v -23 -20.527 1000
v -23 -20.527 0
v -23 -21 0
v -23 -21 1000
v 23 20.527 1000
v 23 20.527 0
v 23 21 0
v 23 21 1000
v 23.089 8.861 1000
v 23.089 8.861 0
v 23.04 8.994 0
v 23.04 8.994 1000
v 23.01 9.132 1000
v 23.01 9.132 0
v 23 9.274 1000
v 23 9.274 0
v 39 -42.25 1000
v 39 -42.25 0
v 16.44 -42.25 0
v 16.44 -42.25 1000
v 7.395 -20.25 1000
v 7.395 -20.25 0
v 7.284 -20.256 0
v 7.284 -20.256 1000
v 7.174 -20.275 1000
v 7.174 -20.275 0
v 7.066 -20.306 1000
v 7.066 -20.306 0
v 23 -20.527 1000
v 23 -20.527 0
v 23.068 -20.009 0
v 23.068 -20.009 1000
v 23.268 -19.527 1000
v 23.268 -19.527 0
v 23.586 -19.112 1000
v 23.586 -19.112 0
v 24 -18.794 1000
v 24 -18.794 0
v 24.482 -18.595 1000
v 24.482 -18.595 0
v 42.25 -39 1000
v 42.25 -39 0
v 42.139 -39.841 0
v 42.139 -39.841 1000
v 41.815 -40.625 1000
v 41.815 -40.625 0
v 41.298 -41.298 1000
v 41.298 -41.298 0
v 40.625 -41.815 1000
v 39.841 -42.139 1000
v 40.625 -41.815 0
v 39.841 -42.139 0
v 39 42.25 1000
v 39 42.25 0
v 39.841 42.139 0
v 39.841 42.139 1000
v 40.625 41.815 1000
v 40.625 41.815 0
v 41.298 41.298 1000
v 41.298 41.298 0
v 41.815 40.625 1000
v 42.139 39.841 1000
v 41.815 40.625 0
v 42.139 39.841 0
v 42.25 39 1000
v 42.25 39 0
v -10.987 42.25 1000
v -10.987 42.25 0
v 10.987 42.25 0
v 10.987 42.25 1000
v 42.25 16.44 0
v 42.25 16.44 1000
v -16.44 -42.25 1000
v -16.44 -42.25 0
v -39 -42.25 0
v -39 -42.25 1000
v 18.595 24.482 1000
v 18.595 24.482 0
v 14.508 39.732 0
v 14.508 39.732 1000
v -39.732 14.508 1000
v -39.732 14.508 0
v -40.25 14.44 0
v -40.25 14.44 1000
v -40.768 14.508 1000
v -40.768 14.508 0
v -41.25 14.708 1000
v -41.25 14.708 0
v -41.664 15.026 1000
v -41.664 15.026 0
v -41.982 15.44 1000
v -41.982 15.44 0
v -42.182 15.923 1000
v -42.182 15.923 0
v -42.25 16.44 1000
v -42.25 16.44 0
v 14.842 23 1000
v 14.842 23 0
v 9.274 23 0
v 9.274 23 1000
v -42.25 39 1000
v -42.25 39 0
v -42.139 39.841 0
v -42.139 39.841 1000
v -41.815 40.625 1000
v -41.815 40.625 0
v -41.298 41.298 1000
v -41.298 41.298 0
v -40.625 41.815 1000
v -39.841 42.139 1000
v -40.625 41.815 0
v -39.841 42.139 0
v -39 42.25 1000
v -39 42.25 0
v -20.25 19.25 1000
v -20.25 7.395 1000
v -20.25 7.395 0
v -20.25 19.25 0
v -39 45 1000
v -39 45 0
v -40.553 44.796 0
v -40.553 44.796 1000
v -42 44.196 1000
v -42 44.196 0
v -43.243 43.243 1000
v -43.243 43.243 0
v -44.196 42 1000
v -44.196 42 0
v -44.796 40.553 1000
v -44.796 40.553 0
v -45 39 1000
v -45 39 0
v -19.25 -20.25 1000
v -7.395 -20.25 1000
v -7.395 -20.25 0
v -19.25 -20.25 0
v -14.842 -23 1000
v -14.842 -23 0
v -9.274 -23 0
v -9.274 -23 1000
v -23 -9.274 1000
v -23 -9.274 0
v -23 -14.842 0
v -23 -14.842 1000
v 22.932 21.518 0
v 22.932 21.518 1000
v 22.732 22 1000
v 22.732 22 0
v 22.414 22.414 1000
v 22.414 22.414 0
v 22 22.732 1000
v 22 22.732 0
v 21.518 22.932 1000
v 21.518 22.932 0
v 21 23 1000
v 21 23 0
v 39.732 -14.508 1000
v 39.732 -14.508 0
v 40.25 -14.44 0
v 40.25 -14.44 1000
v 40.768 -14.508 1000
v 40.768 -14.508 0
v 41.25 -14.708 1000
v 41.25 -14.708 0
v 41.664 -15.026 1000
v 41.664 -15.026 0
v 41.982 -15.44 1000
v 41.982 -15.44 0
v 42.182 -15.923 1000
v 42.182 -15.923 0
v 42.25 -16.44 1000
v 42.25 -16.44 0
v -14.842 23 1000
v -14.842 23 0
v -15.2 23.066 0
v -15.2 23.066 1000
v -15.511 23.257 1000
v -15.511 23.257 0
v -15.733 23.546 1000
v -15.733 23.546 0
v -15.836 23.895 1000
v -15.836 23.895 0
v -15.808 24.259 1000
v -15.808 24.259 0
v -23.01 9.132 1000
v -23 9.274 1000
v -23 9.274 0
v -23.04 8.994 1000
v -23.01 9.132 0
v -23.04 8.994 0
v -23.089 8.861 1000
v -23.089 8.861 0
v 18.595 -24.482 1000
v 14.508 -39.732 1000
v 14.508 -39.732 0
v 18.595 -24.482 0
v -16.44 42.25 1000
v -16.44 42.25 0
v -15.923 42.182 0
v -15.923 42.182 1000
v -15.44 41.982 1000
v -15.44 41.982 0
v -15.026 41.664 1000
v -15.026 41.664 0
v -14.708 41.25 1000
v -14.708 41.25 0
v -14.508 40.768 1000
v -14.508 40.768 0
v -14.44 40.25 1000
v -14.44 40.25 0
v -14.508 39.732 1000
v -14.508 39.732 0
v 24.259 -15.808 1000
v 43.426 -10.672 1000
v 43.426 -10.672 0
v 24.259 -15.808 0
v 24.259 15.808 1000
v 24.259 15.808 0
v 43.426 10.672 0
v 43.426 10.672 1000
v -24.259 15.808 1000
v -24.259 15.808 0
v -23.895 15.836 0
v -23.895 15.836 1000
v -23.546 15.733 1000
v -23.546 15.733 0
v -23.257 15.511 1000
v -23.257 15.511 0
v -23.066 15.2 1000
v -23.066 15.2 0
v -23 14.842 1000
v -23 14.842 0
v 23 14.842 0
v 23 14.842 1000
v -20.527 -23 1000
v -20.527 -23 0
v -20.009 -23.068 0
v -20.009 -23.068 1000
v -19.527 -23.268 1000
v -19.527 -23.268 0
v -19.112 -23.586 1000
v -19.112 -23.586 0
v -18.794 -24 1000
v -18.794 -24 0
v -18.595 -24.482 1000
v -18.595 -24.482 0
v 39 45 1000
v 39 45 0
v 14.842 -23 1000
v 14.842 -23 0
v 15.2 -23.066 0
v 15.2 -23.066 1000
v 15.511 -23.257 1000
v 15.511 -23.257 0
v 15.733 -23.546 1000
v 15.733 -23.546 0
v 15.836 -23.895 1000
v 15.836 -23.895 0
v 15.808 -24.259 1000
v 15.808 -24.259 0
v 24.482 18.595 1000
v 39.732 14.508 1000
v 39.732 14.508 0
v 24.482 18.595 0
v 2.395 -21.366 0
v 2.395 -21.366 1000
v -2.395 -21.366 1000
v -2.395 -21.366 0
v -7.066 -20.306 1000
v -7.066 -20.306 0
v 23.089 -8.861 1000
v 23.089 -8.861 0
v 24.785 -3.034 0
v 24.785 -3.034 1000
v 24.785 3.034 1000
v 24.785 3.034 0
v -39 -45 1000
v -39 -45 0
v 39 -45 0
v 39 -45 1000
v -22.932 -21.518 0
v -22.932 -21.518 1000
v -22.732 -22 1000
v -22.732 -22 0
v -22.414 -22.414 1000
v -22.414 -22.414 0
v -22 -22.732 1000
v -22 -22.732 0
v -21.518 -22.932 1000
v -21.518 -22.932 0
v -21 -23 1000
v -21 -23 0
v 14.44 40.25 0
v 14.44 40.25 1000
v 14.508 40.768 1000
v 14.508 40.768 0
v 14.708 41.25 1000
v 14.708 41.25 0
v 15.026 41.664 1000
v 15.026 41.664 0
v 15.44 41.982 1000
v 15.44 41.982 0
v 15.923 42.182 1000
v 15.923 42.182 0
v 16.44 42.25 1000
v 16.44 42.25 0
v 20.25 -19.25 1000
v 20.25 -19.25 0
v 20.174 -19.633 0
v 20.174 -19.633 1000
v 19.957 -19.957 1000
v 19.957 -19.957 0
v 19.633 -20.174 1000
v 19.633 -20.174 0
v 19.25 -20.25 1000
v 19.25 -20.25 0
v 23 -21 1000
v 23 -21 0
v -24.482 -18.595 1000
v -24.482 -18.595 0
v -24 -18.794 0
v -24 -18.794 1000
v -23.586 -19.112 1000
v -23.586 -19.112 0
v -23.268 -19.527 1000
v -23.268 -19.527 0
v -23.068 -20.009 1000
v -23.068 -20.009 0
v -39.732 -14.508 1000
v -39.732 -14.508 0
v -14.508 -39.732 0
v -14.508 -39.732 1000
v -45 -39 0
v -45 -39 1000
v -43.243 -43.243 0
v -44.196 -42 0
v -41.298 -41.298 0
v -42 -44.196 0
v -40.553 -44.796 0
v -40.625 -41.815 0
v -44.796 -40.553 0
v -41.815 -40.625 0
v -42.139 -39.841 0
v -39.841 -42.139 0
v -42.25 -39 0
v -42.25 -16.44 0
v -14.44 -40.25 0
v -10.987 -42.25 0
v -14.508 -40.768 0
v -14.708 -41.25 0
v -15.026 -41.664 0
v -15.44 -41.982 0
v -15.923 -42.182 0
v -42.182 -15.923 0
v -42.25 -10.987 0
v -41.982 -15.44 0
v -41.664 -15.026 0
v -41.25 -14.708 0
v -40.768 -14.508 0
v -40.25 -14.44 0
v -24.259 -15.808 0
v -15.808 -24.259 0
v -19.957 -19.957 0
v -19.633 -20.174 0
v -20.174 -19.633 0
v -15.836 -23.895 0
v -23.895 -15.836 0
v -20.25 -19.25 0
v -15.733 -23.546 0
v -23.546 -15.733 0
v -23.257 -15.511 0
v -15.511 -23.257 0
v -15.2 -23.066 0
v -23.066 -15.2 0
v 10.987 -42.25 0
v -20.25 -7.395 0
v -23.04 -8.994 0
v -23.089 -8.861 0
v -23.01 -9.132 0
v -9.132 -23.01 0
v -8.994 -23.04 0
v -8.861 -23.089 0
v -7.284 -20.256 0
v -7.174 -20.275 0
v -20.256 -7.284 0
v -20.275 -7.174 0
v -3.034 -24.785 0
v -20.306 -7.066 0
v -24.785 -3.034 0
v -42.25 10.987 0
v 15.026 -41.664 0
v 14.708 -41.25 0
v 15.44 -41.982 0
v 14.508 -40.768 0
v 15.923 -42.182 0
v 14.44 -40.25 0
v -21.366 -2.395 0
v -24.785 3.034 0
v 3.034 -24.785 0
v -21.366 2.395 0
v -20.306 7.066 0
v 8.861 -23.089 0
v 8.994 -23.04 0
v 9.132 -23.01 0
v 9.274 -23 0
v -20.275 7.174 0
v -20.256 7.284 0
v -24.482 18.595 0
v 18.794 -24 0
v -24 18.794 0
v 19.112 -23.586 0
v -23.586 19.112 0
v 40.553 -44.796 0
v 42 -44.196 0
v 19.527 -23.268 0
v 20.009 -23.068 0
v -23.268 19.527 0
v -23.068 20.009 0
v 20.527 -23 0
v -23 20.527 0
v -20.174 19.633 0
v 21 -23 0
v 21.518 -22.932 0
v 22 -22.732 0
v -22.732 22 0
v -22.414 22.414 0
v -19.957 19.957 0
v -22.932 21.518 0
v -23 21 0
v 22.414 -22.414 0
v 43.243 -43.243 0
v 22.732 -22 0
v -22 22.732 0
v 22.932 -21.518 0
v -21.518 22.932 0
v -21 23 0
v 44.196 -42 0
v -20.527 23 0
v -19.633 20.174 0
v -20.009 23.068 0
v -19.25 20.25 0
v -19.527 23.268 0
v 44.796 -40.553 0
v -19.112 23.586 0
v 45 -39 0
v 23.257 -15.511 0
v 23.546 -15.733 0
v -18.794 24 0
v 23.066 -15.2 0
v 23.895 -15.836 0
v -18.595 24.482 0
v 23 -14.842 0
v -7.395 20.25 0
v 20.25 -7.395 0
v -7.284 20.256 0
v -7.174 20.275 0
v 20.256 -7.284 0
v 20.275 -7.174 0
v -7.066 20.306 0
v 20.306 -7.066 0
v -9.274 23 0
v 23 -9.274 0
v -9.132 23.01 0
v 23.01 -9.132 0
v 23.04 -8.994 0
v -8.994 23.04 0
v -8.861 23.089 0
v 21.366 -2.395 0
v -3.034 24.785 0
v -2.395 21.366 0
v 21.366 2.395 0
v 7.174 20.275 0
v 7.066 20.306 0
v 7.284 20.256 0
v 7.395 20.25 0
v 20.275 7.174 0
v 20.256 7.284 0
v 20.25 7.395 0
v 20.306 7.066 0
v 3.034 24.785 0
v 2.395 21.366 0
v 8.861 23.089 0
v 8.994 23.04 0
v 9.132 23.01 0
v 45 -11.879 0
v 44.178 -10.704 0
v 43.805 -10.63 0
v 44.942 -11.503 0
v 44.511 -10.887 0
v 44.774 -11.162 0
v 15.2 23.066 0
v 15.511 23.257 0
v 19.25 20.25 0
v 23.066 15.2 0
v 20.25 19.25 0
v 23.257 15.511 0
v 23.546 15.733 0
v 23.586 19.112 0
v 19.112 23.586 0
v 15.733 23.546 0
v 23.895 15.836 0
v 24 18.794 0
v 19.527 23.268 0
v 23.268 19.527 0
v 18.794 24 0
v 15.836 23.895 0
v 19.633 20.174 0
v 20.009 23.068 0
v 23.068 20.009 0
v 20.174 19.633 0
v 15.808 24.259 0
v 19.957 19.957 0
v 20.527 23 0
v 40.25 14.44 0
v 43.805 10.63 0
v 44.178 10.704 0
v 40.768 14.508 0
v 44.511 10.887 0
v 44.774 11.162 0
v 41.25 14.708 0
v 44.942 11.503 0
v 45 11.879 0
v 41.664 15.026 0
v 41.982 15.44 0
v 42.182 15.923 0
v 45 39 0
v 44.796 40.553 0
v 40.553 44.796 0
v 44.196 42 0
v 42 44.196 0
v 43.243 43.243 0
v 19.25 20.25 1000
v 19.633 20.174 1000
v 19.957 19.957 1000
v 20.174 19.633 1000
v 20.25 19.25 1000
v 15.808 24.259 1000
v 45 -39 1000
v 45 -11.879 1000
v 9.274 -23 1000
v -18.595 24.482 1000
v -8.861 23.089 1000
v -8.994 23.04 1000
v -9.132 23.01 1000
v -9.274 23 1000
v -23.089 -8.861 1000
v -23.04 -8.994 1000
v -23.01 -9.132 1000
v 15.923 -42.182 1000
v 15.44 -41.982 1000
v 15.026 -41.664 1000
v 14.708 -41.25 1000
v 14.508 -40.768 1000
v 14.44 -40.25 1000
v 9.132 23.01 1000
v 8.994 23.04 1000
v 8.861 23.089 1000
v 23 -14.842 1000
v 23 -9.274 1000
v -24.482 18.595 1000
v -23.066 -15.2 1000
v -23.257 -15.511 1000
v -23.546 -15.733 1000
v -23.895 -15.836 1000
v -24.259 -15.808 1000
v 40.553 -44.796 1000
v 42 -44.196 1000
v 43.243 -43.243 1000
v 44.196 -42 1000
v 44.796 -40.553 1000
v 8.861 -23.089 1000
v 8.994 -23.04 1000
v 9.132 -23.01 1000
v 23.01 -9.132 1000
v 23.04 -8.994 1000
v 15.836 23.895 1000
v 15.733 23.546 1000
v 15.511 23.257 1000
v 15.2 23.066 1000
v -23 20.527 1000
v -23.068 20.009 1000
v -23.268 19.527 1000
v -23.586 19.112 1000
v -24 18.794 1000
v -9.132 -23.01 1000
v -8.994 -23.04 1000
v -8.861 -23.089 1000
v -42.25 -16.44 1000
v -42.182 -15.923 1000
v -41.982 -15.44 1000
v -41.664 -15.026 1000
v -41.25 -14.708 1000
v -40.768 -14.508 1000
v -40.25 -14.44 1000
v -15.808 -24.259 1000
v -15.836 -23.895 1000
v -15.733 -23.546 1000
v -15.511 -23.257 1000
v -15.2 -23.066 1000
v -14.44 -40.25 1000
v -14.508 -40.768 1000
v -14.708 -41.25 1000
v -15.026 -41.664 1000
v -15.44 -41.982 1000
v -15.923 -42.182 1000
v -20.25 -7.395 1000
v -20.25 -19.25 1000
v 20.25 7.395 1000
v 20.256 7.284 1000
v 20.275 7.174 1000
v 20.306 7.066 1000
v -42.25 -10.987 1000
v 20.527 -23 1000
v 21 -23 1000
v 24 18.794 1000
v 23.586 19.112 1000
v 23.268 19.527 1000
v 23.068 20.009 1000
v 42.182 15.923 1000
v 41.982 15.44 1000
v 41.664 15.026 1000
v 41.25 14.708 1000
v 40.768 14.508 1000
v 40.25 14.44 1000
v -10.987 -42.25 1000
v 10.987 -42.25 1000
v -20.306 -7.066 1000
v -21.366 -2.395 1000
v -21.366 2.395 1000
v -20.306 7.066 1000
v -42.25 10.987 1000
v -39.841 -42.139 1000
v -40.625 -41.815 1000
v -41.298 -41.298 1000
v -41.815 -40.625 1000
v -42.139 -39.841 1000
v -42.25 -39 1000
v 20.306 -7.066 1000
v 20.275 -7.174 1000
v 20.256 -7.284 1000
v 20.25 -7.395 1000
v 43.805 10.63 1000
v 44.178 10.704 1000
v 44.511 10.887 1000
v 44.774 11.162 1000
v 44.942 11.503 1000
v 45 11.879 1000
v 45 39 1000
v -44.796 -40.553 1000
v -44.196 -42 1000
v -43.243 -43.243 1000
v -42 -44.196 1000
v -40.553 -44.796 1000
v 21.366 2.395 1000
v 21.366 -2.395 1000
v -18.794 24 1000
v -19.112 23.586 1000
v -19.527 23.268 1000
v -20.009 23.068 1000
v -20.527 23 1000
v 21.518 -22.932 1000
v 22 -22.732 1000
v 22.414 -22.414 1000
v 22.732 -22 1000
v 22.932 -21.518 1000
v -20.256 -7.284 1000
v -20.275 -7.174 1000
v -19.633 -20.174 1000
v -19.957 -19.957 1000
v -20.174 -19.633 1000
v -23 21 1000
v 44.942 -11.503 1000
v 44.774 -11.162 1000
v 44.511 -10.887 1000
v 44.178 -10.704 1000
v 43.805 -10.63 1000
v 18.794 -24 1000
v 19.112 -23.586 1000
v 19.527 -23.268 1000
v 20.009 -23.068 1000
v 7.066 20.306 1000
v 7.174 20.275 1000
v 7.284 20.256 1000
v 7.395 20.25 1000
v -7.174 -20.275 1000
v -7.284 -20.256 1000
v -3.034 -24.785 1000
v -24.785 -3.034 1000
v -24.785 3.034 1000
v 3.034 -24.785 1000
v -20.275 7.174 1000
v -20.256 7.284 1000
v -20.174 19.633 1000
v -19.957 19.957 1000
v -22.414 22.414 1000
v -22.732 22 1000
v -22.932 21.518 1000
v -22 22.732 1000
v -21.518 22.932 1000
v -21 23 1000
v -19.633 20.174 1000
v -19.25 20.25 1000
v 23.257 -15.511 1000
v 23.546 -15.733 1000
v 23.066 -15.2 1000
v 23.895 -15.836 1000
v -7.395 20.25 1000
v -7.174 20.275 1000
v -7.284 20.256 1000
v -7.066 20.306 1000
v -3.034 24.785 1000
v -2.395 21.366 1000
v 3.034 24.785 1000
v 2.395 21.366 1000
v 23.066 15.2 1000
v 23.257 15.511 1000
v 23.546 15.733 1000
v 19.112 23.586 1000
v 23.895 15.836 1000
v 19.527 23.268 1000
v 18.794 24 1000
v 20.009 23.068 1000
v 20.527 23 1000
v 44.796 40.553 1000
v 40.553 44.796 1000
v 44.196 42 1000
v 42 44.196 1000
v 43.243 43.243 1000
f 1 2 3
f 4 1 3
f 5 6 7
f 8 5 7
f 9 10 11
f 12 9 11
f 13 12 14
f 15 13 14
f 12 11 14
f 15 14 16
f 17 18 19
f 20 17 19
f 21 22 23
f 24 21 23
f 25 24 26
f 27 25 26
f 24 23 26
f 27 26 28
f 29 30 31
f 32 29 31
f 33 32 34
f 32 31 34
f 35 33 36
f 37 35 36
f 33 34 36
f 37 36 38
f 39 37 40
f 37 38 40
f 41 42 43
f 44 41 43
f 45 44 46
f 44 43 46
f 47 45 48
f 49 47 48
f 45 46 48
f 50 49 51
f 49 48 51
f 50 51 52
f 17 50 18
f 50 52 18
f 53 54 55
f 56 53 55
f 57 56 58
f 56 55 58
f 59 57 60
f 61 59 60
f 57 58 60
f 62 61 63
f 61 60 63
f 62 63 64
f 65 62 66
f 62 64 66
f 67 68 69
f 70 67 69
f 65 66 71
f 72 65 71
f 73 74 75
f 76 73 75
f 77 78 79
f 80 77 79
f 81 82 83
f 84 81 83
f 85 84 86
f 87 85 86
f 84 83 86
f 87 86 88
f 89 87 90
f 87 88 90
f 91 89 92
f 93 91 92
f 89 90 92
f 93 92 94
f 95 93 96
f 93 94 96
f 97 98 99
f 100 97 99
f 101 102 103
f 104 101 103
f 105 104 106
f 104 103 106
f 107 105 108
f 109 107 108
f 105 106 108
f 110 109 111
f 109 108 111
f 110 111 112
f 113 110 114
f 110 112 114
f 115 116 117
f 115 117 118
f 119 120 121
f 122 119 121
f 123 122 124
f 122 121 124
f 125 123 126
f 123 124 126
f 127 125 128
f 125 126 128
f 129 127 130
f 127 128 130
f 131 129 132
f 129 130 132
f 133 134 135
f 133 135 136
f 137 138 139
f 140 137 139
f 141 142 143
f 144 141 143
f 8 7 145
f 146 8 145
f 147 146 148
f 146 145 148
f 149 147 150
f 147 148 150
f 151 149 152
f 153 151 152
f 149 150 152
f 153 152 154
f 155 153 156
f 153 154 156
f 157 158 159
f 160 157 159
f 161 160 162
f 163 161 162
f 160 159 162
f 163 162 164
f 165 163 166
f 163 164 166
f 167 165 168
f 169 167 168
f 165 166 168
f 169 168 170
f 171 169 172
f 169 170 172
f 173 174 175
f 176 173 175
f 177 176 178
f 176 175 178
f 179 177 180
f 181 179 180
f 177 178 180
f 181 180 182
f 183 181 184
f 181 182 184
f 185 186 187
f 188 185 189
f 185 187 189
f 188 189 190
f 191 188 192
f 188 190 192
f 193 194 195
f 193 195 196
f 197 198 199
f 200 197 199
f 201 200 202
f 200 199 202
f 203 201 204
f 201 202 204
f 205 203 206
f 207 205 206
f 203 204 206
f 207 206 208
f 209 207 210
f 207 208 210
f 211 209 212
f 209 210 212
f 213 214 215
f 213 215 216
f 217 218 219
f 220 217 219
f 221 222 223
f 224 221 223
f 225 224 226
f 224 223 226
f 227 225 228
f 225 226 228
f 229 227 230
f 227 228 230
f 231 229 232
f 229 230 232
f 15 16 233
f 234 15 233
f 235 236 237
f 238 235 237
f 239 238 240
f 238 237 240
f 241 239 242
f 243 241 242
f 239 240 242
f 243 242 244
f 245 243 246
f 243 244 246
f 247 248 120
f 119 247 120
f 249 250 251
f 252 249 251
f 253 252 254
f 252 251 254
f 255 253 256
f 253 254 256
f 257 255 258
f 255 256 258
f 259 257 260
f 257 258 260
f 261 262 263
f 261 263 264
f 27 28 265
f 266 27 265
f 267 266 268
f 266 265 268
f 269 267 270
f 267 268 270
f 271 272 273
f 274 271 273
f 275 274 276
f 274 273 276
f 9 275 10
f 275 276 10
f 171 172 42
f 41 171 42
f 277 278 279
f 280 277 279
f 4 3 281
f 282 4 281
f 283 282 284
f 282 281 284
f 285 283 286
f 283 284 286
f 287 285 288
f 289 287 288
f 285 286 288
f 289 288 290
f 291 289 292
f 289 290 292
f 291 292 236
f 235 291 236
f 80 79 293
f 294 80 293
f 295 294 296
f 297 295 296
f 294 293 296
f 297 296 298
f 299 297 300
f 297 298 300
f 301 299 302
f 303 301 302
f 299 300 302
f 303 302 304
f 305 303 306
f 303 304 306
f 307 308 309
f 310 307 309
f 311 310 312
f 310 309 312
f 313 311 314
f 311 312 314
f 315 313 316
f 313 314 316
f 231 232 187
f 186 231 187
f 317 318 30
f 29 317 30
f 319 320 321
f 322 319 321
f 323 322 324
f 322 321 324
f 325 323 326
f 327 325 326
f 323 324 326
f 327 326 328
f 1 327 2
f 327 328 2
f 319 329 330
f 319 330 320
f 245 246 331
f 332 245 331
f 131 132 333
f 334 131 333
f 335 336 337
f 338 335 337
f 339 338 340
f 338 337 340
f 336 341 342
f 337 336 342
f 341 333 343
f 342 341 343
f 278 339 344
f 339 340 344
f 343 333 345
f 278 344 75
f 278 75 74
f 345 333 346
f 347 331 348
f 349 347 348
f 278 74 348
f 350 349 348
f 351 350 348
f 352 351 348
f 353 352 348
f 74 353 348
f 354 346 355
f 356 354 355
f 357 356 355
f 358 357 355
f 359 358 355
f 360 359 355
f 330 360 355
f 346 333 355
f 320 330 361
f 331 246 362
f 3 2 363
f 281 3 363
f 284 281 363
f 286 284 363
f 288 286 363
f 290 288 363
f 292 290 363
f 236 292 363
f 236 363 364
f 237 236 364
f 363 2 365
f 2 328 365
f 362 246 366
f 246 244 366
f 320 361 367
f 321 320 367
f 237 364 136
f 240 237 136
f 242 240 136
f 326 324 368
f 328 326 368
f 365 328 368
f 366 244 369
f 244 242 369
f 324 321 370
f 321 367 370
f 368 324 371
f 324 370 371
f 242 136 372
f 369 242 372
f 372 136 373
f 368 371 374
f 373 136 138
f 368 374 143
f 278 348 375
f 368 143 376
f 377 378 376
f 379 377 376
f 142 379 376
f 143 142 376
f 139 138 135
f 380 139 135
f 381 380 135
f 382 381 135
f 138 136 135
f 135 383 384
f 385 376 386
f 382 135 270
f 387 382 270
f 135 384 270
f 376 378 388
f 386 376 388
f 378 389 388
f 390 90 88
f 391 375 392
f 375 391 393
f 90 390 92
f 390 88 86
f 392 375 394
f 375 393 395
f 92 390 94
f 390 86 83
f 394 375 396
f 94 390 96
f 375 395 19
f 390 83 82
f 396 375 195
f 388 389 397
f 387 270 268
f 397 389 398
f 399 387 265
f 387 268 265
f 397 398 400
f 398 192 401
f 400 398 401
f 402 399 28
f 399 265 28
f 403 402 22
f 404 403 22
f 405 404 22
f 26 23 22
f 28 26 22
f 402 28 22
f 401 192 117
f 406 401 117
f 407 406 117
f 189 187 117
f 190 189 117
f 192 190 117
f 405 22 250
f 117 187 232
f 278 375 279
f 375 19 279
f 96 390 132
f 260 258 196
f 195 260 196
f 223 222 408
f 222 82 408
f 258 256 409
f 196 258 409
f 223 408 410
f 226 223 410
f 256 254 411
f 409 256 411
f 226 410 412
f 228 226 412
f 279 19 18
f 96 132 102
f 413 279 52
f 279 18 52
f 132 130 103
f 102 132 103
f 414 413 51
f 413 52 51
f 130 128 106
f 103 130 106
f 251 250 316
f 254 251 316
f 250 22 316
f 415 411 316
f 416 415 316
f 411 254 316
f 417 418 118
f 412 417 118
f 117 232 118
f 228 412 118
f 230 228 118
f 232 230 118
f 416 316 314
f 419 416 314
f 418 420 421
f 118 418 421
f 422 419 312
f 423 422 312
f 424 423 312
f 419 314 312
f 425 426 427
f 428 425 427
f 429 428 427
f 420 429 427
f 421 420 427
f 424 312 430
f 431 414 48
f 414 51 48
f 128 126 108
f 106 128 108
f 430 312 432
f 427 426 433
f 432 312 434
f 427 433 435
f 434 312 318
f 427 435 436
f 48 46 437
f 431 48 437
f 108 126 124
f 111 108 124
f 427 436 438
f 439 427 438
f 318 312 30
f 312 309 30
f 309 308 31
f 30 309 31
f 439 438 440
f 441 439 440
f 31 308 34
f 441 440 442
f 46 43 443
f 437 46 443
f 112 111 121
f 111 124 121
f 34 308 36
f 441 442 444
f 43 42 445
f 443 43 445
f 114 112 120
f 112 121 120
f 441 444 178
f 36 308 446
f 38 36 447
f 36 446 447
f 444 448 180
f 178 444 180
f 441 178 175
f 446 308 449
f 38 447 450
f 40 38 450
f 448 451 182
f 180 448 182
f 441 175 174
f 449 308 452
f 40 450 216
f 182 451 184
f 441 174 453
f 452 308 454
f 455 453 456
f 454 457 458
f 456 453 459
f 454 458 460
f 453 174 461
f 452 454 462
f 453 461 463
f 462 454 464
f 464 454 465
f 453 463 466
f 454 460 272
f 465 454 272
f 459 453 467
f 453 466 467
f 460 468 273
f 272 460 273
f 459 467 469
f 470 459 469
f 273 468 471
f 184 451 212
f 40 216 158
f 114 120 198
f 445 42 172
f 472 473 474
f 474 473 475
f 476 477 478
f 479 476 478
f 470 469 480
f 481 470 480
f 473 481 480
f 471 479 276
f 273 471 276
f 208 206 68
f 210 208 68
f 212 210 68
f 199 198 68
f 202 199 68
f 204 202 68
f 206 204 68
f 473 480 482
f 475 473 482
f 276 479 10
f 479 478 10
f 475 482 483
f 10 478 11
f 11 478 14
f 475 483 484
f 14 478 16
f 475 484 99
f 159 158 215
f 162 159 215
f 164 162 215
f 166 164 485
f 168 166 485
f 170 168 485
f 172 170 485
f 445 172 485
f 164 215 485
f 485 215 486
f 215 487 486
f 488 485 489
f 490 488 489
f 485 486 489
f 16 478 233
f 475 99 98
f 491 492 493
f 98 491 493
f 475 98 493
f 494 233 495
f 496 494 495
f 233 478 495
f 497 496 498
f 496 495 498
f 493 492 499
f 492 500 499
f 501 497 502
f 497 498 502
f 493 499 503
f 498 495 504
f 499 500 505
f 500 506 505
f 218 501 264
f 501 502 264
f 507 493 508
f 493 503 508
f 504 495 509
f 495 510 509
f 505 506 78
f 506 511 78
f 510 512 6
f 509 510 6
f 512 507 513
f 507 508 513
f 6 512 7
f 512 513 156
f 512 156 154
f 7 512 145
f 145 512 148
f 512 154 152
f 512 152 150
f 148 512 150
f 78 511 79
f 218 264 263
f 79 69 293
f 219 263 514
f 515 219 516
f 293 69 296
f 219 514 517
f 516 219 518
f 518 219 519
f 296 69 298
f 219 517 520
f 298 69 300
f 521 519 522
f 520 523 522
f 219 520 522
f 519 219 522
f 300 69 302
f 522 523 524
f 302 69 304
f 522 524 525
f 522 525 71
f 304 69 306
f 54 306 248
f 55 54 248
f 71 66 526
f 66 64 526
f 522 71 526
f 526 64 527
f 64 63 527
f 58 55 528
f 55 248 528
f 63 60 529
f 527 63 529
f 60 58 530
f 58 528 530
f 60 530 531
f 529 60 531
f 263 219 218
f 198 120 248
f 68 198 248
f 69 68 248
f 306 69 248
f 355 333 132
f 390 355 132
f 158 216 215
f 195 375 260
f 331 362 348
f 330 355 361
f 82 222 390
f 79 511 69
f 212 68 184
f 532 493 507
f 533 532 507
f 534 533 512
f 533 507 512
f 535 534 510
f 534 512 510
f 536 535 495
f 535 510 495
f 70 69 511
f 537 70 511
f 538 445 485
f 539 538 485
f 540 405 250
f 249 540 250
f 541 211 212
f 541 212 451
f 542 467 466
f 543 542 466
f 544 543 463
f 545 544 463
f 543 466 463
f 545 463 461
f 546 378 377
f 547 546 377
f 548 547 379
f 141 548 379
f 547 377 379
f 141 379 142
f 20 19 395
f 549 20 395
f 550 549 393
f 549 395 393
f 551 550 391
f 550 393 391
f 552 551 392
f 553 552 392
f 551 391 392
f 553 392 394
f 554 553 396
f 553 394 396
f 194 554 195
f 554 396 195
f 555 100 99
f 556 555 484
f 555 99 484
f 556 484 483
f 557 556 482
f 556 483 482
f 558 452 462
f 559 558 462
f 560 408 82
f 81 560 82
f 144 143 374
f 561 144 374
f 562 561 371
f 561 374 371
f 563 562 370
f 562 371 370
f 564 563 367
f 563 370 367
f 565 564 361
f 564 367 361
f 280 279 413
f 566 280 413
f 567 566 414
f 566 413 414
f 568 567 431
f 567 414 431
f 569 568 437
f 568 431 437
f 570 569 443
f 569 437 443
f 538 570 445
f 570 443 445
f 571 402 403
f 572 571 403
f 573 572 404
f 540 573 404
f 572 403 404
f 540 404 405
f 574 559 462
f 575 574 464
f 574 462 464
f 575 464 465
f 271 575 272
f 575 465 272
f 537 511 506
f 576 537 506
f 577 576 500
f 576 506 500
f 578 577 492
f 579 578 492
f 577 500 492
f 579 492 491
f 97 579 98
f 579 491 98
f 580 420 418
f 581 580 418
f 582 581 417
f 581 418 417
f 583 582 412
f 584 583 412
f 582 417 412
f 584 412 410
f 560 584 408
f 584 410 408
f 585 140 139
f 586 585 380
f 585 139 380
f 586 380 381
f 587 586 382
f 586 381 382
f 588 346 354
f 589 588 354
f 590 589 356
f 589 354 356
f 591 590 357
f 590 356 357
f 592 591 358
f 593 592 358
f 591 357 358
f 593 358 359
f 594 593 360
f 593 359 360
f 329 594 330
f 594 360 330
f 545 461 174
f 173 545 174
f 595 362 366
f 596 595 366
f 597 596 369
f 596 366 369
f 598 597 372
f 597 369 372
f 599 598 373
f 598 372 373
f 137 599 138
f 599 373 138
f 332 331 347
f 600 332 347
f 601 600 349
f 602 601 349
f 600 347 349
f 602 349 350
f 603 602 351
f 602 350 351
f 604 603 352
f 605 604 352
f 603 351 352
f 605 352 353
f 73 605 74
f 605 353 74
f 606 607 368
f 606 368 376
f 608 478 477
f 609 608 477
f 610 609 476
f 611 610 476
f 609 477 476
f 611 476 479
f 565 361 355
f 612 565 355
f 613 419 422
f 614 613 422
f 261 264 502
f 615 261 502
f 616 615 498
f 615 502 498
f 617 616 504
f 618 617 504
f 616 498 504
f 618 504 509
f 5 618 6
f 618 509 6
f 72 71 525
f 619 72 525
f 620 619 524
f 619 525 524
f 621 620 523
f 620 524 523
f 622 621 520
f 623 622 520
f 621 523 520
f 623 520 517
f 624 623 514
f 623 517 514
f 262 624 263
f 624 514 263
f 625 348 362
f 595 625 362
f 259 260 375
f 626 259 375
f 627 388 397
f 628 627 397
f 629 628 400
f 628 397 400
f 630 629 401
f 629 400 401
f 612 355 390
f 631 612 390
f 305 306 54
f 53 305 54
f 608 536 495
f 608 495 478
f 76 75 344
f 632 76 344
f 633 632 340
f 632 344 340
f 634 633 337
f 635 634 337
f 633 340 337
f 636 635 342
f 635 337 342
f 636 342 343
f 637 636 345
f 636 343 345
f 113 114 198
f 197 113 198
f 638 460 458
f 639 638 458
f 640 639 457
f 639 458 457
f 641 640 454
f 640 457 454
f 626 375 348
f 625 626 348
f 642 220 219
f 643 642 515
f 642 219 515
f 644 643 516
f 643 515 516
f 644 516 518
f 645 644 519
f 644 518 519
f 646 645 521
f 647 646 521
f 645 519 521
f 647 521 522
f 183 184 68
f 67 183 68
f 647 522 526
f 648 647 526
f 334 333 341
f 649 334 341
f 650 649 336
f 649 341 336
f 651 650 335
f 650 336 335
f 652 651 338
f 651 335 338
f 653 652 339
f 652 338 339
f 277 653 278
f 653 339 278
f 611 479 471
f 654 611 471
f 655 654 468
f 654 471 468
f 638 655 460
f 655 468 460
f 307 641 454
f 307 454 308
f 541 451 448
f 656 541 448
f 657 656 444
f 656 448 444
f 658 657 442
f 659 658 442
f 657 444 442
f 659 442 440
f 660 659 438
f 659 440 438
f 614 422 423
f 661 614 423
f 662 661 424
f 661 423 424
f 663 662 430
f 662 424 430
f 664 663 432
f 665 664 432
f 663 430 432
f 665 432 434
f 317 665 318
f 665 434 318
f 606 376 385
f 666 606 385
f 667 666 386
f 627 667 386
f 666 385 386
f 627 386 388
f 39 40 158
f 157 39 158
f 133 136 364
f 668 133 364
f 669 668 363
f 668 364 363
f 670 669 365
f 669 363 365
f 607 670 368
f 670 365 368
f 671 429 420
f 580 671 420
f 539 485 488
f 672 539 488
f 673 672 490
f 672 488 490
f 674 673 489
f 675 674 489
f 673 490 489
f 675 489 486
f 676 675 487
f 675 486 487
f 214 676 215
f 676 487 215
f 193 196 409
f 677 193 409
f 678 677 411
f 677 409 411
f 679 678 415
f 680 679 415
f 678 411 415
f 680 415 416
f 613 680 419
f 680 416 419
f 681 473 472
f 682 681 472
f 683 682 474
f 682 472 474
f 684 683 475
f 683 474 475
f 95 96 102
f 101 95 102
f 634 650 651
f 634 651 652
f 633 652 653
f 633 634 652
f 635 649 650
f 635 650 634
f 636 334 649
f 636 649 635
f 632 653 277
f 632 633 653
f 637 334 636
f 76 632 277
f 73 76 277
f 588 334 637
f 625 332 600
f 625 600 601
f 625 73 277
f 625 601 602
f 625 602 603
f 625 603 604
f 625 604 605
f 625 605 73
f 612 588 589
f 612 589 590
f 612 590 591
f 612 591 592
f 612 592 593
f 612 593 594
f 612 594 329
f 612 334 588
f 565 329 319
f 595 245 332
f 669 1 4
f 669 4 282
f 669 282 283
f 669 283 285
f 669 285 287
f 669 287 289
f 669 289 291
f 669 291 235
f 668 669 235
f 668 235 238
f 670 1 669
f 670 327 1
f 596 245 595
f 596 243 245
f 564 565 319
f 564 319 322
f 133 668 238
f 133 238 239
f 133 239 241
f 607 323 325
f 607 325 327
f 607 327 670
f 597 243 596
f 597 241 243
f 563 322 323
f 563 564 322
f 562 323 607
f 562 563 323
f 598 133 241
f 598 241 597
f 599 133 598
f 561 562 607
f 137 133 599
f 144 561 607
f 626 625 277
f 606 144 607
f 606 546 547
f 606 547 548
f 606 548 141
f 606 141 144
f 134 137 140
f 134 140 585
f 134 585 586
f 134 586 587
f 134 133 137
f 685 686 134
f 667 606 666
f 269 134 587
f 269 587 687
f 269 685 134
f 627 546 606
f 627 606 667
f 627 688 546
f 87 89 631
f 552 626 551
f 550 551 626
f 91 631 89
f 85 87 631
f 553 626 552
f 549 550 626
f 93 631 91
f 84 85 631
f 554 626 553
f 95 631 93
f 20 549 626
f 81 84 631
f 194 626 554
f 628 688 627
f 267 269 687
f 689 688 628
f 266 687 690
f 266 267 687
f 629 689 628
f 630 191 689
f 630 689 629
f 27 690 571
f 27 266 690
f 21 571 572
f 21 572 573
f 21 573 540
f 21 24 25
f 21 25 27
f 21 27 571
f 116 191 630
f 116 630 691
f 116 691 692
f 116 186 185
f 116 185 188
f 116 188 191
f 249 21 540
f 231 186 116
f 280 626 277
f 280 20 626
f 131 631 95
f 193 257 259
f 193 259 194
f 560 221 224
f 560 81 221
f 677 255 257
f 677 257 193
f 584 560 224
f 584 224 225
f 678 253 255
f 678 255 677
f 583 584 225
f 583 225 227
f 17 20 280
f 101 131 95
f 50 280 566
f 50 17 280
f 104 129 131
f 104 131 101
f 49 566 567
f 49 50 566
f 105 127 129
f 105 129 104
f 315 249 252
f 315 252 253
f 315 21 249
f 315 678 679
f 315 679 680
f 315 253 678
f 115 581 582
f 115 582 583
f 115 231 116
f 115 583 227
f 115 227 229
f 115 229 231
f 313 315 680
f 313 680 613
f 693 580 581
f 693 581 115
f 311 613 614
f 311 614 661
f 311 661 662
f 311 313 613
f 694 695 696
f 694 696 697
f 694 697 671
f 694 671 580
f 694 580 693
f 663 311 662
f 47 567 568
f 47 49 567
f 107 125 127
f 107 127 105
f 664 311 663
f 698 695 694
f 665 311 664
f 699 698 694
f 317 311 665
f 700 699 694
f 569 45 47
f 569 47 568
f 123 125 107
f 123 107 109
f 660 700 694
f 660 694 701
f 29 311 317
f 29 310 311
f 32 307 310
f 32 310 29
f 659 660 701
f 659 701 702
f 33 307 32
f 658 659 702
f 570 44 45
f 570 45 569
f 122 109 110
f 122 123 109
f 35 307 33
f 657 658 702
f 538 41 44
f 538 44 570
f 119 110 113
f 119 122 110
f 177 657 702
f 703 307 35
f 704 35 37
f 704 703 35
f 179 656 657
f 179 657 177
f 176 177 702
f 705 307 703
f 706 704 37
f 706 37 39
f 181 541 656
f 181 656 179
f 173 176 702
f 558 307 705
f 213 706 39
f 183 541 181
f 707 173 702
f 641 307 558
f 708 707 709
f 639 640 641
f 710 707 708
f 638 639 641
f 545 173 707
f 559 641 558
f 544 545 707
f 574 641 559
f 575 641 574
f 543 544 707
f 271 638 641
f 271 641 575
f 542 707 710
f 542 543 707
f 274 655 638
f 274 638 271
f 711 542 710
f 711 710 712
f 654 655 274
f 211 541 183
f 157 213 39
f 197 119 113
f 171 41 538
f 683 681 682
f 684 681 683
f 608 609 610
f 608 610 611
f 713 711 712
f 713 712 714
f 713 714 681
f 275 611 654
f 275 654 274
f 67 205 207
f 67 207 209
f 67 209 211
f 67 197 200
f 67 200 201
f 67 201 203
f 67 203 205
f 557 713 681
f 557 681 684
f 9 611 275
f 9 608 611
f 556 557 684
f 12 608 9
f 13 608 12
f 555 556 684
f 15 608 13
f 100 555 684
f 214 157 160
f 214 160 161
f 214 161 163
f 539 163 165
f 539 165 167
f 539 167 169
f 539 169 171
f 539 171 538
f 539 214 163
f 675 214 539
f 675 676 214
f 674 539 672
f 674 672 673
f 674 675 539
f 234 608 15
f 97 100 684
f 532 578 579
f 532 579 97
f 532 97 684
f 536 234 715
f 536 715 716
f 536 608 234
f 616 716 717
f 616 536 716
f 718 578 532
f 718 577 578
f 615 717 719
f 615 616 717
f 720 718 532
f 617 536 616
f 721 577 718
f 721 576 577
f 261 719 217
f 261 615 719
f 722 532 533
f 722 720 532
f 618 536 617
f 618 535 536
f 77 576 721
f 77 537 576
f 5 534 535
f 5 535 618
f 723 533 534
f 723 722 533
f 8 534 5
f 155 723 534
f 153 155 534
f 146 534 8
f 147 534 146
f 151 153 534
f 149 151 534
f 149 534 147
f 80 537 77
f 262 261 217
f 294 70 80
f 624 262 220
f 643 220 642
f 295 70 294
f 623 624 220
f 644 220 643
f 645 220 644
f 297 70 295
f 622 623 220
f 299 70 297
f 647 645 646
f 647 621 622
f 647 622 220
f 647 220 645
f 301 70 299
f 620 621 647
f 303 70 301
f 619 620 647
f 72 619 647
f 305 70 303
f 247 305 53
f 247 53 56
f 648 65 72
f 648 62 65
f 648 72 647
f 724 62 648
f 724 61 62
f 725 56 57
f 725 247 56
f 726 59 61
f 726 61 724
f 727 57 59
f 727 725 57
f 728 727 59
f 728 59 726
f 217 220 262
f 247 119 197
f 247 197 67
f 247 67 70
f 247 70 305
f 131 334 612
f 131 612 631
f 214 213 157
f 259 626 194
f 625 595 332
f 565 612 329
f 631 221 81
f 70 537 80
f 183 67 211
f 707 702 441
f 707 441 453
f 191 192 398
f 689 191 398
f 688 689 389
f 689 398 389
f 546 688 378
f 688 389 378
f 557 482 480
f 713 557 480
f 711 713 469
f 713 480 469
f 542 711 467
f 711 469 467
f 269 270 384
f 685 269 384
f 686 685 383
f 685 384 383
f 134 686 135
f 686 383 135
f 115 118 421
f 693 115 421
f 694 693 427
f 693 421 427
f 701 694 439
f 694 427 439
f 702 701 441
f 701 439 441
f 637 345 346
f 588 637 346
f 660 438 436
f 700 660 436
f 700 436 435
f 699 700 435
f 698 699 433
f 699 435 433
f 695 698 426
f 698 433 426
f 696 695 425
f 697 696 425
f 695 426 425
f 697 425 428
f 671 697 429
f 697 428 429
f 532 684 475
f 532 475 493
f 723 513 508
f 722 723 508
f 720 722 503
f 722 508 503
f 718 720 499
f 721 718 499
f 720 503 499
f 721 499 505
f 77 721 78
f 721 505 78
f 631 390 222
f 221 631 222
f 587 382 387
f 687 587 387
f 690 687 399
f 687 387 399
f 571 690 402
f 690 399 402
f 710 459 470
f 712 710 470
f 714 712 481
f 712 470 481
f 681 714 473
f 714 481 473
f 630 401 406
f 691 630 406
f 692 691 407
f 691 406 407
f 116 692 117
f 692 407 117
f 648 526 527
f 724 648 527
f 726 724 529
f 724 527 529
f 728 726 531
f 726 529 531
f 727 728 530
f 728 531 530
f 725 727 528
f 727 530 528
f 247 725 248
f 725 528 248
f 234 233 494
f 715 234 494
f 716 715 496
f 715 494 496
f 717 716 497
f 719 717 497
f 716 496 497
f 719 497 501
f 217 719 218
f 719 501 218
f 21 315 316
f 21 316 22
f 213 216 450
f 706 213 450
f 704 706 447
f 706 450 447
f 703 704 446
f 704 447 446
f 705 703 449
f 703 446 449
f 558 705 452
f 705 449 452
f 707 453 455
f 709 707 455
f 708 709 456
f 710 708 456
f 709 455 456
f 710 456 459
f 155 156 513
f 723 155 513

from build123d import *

# Parameters (mm, degrees)
F1_DEPTH = 1000


# Not quite as in the source:
# - ends of sketch curves that miss each other by under 0.0002 mm in the source are joined


with BuildPart() as f1:
    # F0 (on Top) → F1 (new body)
    with BuildSketch(Plane.XY):
        with BuildLine():
            Line((23, 9.273618), (23, 14.841657))
            ThreePointArc((23, 14.841657), (23.3912385359, 15.6350103133), (24.2588189596, 15.8075828492))
            Line((24.2588189596, 15.8075828492), (43.426476, 10.671624))
            ThreePointArc((43.426476, 10.671624), (44.5109517857, 10.8873403242), (45, 11.879032))
            Line((45, 11.879032), (45, 39))
            ThreePointArc((45, 39), (43.2426406871, 43.2426406871), (39, 45))
            Line((39, 45), (-39, 45))
            ThreePointArc((-39, 45), (-43.2426406871, 43.2426406871), (-45, 39))
            Line((-45, 39), (-45, -39))
            ThreePointArc((-45, -39), (-43.2426406871, -43.2426406871), (-39, -45))
            Line((-39, -45), (39, -45))
            ThreePointArc((39, -45), (43.2426406871, -43.2426406871), (45, -39))
            Line((45, -39), (45, -11.879032))
            ThreePointArc((45, -11.879032), (44.5109517857, -10.8873403242), (43.4264761923, -10.6716247175))
            Line((43.4264761923, -10.6716247175), (24.258819, -15.807583))
            ThreePointArc((24.258819, -15.807583), (23.3912385359, -15.6350103133), (23, -14.841657))
            Line((23, -14.841657), (23, -9.273618))
            ThreePointArc((23, -9.273618), (23.022474706, -9.062799833), (23.0888885991, -8.8614578186))
            ThreePointArc((23.0888885991, -8.8614578186), (25, 0), (23.0888887851, 8.8614579028))
            ThreePointArc((23.0888887851, 8.8614579028), (23.022474706, 9.062799833), (23, 9.273618))
        make_face()
        with BuildLine():
            Line((15.807583, -24.258819), (10.98686, -42.25))
            Line((10.98686, -42.25), (-10.98686, -42.25))
            Line((-10.98686, -42.25), (-15.807583, -24.258819))
            ThreePointArc((-15.807583, -24.258819), (-15.6350103133, -23.3912385359), (-14.841657, -23))
            Line((-14.841657, -23), (-9.273618, -23))
            ThreePointArc((-9.273618, -23), (-9.062799833, -23.022474706), (-8.8614578186, -23.0888885991))
            ThreePointArc((-8.8614578186, -23.0888885991), (0, -25), (8.8614579028, -23.0888887851))
            ThreePointArc((8.8614579028, -23.0888887851), (9.062799833, -23.022474706), (9.273618, -23))
            Line((9.273618, -23), (14.841657, -23))
            ThreePointArc((14.841657, -23), (15.6350103133, -23.3912385359), (15.807583, -24.258819))
        make_face(mode=Mode.SUBTRACT)
        with BuildLine():
            ThreePointArc((-42.25, -16.440321), (-41.4675229282, -14.8536143733), (-39.7323620808, -14.5084693016))
            Line((-39.7323620808, -14.5084693016), (-24.482362, -18.594694))
            ThreePointArc((-24.482362, -18.594694), (-23.4132933733, -19.3090230718), (-23, -20.526546))
            Line((-23, -20.526546), (-23, -21))
            ThreePointArc((-23, -21), (-22.4142135624, -22.4142135624), (-21, -23))
            Line((-21, -23), (-20.526546, -23))
            ThreePointArc((-20.526546, -23), (-19.3090230718, -23.4132933733), (-18.5946943016, -24.4823620808))
            Line((-18.5946943016, -24.4823620808), (-14.508469, -39.732362))
            ThreePointArc((-14.508469, -39.732362), (-14.8536143733, -41.4675229282), (-16.440321, -42.25))
            Line((-16.440321, -42.25), (-39, -42.25))
            ThreePointArc((-39, -42.25), (-41.2980970389, -41.2980970389), (-42.25, -39))
            Line((-42.25, -39), (-42.25, -16.440321))
        make_face(mode=Mode.SUBTRACT)
        with BuildLine():
            ThreePointArc((16.440321, -42.25), (14.8536143733, -41.4675229282), (14.5084693016, -39.7323620808))
            Line((14.5084693016, -39.7323620808), (18.594694, -24.482362))
            ThreePointArc((18.594694, -24.482362), (19.3090230718, -23.4132933733), (20.526546, -23))
            Line((20.526546, -23), (21, -23))
            ThreePointArc((21, -23), (22.4142135624, -22.4142135624), (23, -21))
            Line((23, -21), (23, -20.526546))
            ThreePointArc((23, -20.526546), (23.4132933733, -19.3090230718), (24.4823620808, -18.5946943016))
            Line((24.4823620808, -18.5946943016), (39.732362, -14.508469))
            ThreePointArc((39.732362, -14.508469), (41.4675229282, -14.8536143733), (42.25, -16.440321))
            Line((42.25, -16.440321), (42.25, -39))
            ThreePointArc((42.25, -39), (41.2980970389, -41.2980970389), (39, -42.25))
            Line((39, -42.25), (16.440321, -42.25))
        make_face(mode=Mode.SUBTRACT)
        with BuildLine():
            Line((-24.258819, -15.807583), (-42.25, -10.98686))
            Line((-42.25, -10.98686), (-42.25, 10.98686))
            Line((-42.25, 10.98686), (-24.258819, 15.807583))
            ThreePointArc((-24.258819, 15.807583), (-23.3912385359, 15.6350103133), (-23, 14.841657))
            Line((-23, 14.841657), (-23, 9.273618))
            ThreePointArc((-23, 9.273618), (-23.022474706, 9.062799833), (-23.0888885991, 8.8614578186))
            ThreePointArc((-23.0888885991, 8.8614578186), (-25, 0), (-23.0888887851, -8.8614579028))
            ThreePointArc((-23.0888887851, -8.8614579028), (-23.022474706, -9.062799833), (-23, -9.273618))
            Line((-23, -9.273618), (-23, -14.841657))
            ThreePointArc((-23, -14.841657), (-23.3912385359, -15.6350103133), (-24.258819, -15.807583))
        make_face(mode=Mode.SUBTRACT)
        with BuildLine():
            ThreePointArc((19.25, 20.25), (19.9571067812, 19.9571067812), (20.25, 19.25))
            Line((20.25, 19.25), (20.25, 7.3951))
            ThreePointArc((20.25, 7.3951), (20.2639867072, 7.2284333074), (20.3055555728, 7.0664288513))
            ThreePointArc((20.3055554887, 7.066428822), (21.5, 0), (20.3055554887, -7.066428822))
            ThreePointArc((20.3055555728, -7.0664288513), (20.2639867072, -7.2284333074), (20.25, -7.3951))
            Line((20.25, -7.3951), (20.25, -19.25))
            ThreePointArc((20.25, -19.25), (19.9571067812, -19.9571067812), (19.25, -20.25))
            Line((19.25, -20.25), (7.3951, -20.25))
            ThreePointArc((7.3951, -20.25), (7.2284333074, -20.2639867072), (7.0664288513, -20.3055555728))
            ThreePointArc((7.066428822, -20.3055554887), (0, -21.5), (-7.066428822, -20.3055554887))
            ThreePointArc((-7.0664288513, -20.3055555728), (-7.2284333074, -20.2639867072), (-7.3951, -20.25))
            Line((-7.3951, -20.25), (-19.25, -20.25))
            ThreePointArc((-19.25, -20.25), (-19.9571067812, -19.9571067812), (-20.25, -19.25))
            Line((-20.25, -19.25), (-20.25, -7.3951))
            ThreePointArc((-20.25, -7.3951), (-20.2639867072, -7.2284333074), (-20.3055555728, -7.0664288513))
            ThreePointArc((-20.3055554887, -7.066428822), (-21.5, 0), (-20.3055554887, 7.066428822))
            ThreePointArc((-20.3055555728, 7.0664288513), (-20.2639867072, 7.2284333074), (-20.25, 7.3951))
            Line((-20.25, 7.3951), (-20.25, 19.25))
            ThreePointArc((-20.25, 19.25), (-19.9571067812, 19.9571067812), (-19.25, 20.25))
            Line((-19.25, 20.25), (-7.3951, 20.25))
            ThreePointArc((-7.3951, 20.25), (-7.2284333074, 20.2639867072), (-7.0664288513, 20.3055555728))
            ThreePointArc((-7.066428822, 20.3055554887), (0, 21.5), (7.066428822, 20.3055554887))
            ThreePointArc((7.0664288513, 20.3055555728), (7.2284333074, 20.2639867072), (7.3951, 20.25))
            Line((7.3951, 20.25), (19.25, 20.25))
        make_face(mode=Mode.SUBTRACT)
        with BuildLine():
            ThreePointArc((-16.440321, 42.25), (-14.8536143733, 41.4675229282), (-14.5084693016, 39.7323620808))
            Line((-14.5084693016, 39.7323620808), (-18.594694, 24.482362))
            ThreePointArc((-18.594694, 24.482362), (-19.3090230718, 23.4132933733), (-20.526546, 23))
            Line((-20.526546, 23), (-21, 23))
            ThreePointArc((-21, 23), (-22.4142135624, 22.4142135624), (-23, 21))
            Line((-23, 21), (-23, 20.526546))
            ThreePointArc((-23, 20.526546), (-23.4132933733, 19.3090230718), (-24.4823620808, 18.5946943016))
            Line((-24.4823620808, 18.5946943016), (-39.732362, 14.508469))
            ThreePointArc((-39.732362, 14.508469), (-41.4675229282, 14.8536143733), (-42.25, 16.440321))
            Line((-42.25, 16.440321), (-42.25, 39))
            ThreePointArc((-42.25, 39), (-41.2980970389, 41.2980970389), (-39, 42.25))
            Line((-39, 42.25), (-16.440321, 42.25))
        make_face(mode=Mode.SUBTRACT)
        with BuildLine():
            ThreePointArc((15.8075828492, 24.2588189596), (15.6350103133, 23.3912385359), (14.841657, 23))
            Line((14.841657, 23), (9.273618, 23))
            ThreePointArc((9.273618, 23), (9.062799833, 23.022474706), (8.8614578186, 23.0888885991))
            ThreePointArc((8.8614578186, 23.0888885991), (0, 25), (-8.8614579028, 23.0888887851))
            ThreePointArc((-8.8614579028, 23.0888887851), (-9.062799833, 23.022474706), (-9.273618, 23))
            Line((-9.273618, 23), (-14.841657, 23))
            ThreePointArc((-14.841657, 23), (-15.6350103133, 23.3912385359), (-15.8075828492, 24.2588189596))
            Line((-15.8075828492, 24.2588189596), (-10.98686, 42.25))
            Line((-10.98686, 42.25), (10.98686, 42.25))
            Line((10.98686, 42.25), (15.8075828492, 24.2588189596))
        make_face(mode=Mode.SUBTRACT)
        with BuildLine():
            ThreePointArc((42.25, 16.440321), (41.4675229282, 14.8536143733), (39.7323620808, 14.5084693016))
            Line((39.7323620808, 14.5084693016), (24.482362, 18.594694))
            ThreePointArc((24.482362, 18.594694), (23.4132933733, 19.3090230718), (23, 20.526546))
            Line((23, 20.526546), (23, 21))
            ThreePointArc((23, 21), (22.4142135624, 22.4142135624), (21, 23))
            Line((21, 23), (20.526546, 23))
            ThreePointArc((20.526546, 23), (19.3090230718, 23.4132933733), (18.5946943016, 24.4823620808))
            Line((18.5946943016, 24.4823620808), (14.508469, 39.732362))
            ThreePointArc((14.508469, 39.732362), (14.8536143733, 41.4675229282), (16.440321, 42.25))
            Line((16.440321, 42.25), (39, 42.25))
            ThreePointArc((39, 42.25), (41.2980970389, 41.2980970389), (42.25, 39))
            Line((42.25, 39), (42.25, 16.440321))
        make_face(mode=Mode.SUBTRACT)
    extrude(amount=F1_DEPTH)


solid = f1.part
